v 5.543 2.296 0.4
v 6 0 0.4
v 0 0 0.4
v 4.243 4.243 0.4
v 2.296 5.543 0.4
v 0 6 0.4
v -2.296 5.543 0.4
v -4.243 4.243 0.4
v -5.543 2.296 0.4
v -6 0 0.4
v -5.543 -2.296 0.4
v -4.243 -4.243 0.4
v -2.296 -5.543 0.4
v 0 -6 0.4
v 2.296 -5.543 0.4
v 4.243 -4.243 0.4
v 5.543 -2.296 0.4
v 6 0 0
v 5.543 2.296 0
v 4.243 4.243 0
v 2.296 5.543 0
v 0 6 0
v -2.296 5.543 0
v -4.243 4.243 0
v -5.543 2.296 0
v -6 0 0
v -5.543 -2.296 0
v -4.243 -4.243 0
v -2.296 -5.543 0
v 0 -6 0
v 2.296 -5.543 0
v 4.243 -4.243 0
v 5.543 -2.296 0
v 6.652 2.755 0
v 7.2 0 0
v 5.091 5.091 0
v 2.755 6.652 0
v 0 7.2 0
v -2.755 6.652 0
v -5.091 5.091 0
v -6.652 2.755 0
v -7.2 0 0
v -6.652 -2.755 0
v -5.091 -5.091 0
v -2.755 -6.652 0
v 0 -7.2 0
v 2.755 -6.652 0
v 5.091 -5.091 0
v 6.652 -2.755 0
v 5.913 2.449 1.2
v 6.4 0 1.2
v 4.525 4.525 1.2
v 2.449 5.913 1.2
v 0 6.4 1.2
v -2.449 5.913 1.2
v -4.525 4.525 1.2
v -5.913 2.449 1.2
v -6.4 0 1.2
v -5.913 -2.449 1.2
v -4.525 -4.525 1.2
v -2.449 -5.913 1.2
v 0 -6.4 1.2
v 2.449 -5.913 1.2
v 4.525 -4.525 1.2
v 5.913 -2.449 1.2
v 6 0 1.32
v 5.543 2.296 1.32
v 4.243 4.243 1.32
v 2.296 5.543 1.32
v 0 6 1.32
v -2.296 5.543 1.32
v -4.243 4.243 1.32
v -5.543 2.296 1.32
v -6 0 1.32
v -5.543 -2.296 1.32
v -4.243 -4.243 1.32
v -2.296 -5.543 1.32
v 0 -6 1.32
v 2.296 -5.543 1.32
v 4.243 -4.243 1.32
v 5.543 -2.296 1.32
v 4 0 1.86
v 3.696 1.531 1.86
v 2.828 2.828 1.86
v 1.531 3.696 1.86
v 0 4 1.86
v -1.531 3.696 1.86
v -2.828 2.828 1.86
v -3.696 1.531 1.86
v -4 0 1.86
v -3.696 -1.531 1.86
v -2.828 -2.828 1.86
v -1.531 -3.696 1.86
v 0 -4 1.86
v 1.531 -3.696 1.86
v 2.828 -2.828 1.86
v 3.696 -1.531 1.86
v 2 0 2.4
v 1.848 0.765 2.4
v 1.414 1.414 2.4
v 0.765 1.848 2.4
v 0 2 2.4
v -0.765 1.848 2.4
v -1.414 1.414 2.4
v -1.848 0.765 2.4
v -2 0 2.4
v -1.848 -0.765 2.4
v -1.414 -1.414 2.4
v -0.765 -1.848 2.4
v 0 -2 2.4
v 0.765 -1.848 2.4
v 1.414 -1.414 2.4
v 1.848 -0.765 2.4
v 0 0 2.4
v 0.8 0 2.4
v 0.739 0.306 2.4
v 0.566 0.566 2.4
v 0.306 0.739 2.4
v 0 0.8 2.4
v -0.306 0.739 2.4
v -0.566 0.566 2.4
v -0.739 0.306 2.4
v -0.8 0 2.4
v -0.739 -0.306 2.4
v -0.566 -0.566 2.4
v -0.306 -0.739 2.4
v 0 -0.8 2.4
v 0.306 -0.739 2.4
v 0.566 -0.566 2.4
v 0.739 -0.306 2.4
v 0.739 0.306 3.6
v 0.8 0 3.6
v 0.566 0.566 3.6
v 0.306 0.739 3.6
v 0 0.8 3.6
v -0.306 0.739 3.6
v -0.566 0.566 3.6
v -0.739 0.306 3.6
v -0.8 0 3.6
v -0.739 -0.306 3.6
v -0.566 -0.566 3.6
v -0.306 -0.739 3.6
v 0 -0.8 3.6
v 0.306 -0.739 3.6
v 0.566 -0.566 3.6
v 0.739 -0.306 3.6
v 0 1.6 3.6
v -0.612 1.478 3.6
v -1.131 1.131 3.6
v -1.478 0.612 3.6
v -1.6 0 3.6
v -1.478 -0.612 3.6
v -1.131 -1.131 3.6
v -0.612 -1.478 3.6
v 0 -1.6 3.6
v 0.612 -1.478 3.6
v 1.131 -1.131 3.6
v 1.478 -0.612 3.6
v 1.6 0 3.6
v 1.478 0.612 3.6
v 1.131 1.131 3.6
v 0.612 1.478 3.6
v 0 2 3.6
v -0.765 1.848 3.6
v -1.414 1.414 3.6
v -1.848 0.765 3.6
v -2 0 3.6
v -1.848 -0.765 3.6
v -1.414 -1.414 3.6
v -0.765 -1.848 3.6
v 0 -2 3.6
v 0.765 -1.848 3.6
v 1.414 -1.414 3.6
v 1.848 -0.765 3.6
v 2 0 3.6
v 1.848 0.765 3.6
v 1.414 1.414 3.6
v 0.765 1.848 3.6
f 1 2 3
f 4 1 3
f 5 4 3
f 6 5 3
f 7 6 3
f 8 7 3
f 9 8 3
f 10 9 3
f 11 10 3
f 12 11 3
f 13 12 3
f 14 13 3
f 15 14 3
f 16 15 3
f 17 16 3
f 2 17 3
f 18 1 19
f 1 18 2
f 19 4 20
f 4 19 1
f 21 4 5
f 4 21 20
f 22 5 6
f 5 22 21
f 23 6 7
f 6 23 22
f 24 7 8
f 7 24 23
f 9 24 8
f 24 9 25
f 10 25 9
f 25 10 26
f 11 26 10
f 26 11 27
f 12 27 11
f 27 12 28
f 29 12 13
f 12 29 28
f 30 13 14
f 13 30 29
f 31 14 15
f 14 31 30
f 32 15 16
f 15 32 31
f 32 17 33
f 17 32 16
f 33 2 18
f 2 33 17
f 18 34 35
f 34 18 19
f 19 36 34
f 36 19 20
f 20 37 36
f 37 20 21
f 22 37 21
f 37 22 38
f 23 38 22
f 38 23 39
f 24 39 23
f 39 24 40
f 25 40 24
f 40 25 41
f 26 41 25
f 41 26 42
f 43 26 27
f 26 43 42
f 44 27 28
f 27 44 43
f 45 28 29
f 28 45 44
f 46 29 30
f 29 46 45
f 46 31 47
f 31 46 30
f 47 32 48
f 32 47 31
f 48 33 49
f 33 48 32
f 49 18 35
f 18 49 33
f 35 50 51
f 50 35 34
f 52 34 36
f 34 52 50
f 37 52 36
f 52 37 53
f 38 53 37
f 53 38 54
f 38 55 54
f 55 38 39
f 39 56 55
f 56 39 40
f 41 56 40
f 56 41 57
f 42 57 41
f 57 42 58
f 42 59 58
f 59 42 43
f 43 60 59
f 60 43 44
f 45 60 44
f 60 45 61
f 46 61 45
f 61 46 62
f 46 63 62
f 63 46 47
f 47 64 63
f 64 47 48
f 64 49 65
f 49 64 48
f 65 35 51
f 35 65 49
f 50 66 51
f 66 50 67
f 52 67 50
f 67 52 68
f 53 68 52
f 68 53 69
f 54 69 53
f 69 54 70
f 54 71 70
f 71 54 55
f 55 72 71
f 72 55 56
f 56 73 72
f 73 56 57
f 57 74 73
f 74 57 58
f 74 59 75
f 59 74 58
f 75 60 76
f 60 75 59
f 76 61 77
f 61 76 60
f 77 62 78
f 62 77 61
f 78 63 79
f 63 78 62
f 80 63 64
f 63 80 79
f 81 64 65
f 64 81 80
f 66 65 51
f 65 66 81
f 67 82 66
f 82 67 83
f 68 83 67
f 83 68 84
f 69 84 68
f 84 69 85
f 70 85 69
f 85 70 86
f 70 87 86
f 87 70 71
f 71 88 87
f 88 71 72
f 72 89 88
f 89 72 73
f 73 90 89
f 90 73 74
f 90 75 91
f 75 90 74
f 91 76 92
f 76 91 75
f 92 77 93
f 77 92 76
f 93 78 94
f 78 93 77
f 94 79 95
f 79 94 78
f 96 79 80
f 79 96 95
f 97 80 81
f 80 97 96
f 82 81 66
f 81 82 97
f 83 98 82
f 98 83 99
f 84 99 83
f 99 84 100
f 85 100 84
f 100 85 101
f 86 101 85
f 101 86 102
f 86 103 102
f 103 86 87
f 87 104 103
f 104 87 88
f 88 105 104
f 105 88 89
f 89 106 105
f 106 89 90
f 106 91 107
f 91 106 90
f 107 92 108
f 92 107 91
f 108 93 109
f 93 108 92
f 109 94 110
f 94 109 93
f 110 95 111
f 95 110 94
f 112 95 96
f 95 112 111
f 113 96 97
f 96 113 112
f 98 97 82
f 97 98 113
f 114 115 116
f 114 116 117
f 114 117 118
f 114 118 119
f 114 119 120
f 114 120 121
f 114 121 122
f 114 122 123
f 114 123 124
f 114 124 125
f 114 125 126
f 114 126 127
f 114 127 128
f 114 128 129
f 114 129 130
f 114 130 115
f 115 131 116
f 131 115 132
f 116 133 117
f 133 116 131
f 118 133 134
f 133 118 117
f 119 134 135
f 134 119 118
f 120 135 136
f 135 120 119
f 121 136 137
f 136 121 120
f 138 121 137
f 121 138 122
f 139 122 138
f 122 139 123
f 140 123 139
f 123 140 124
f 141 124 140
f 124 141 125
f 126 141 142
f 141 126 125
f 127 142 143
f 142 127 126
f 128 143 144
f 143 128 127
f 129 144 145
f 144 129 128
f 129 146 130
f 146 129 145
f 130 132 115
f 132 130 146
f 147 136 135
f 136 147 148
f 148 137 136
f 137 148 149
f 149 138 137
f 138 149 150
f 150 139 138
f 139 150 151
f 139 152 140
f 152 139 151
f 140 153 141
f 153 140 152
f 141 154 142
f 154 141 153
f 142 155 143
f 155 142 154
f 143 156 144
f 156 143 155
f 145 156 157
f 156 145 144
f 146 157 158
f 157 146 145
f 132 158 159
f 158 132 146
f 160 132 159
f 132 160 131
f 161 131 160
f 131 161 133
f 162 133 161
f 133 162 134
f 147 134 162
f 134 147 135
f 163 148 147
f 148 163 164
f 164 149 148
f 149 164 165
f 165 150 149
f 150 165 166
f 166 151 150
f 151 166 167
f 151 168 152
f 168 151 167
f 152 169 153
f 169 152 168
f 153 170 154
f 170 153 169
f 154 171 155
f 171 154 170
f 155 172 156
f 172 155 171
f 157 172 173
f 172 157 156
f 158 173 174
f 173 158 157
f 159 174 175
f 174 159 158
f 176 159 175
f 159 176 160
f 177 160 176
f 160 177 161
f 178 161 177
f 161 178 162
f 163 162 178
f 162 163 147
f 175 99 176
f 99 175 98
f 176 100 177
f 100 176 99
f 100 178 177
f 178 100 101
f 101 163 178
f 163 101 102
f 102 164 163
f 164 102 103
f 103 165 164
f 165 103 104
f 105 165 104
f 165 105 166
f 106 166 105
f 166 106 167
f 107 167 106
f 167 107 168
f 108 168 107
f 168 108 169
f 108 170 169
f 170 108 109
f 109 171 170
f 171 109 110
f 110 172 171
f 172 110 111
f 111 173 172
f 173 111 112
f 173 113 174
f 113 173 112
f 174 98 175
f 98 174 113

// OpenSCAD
use <../lib.scad>
use <../p/4-4con1.scad>
use <../p/4-4con15.scad>
use <../p/4-4con2.scad>
use <../p/4-4con8.scad>
use <../p/4-4cylc.scad>
use <../p/4-4cyli.scad>
use <../p/4-4edge.scad>
use <../p/4-4ring1.scad>
use <../p/4-4ring4.scad>
use <../p/4-4ring5.scad>
$fa=1; $fs=0.2;
function ldraw_lib__745(realsolid=false) = [
// 0 Roadsign Base Round Type 1
// 0 Name: 745.dat
// 0 Author: Tore Eriksson [Tore_Eriksson]
// 0 !LDRAW_ORG Part UPDATE 2010-02
// 0 !LICENSE Licensed under CC BY 2.0 and CC BY 4.0 : see CAreadme.txt
// 
// 0 BFC CERTIFY CCW
  [0,"BFC","CERTIFY"],
  [0,"BFC","CCW"],
// 
// 0 !CMDLINE -c8
// 
// 0 !HISTORY 2000-09-30 [PTadmin] Official Update 2000-02
// 0 !HISTORY 2007-07-22 [PTadmin] Header formatted for Contributor Agreement
// 0 !HISTORY 2008-07-01 [PTadmin] Official Update 2008-01
// 0 !HISTORY 2009-07-06 [tchang] Changed proportions, add BFC, primitives
// 0 !HISTORY 2010-07-05 [PTadmin] Official Update 2010-02
// 
// 
// 0 BFC INVERTNEXT
  [0,"BFC","INVERTNEXT"],
// 1 16 0 -1 0 15 0 0 0 1 0 0 0 15 4-4cylc.dat
  [1,16,0,-1,0,15,0,0,0,1,0,0,0,15, ldraw_lib__4_4cylc(realsolid)],
// 1 16 0 0 0 3 0 0 0 -1 0 0 0 3 4-4ring5.dat
  [1,16,0,0,0,3,0,0,0,-1,0,0,0,3, ldraw_lib__4_4ring5(realsolid)],
// 1 16 0 0 0 18 0 0 0 1 0 0 0 18 4-4edge.dat
  [1,16,0,0,0,18,0,0,0,1,0,0,0,18, ldraw_lib__4_4edge(realsolid)],
// 0 //
// 1 16 0 0 0 2 0 0 0 -3 0 0 0 2 4-4con8.dat
  [1,16,0,0,0,2,0,0,0,-3,0,0,0,2, ldraw_lib__4_4con8(realsolid)],
// 1 16 0 -3 0 16 0 0 0 1 0 0 0 16 4-4edge.dat
  [1,16,0,-3,0,16,0,0,0,1,0,0,0,16, ldraw_lib__4_4edge(realsolid)],
// 0 //
// 1 16 0 -3 0 1 0 0 0 -0.3 0 0 0 1 4-4con15.dat
  [1,16,0,-3,0,1,0,0,0,-0.3,0,0,0,1, ldraw_lib__4_4con15(realsolid)],
// 1 16 0 -3.3 0 5 0 0 0 -1.35 0 0 0 5 4-4con2.dat
  [1,16,0,-3.3,0,5,0,0,0,-1.35,0,0,0,5, ldraw_lib__4_4con2(realsolid)],
// 1 16 0 -4.65 0 5 0 0 0 -1.35 0 0 0 5 4-4con1.dat
  [1,16,0,-4.65,0,5,0,0,0,-1.35,0,0,0,5, ldraw_lib__4_4con1(realsolid)],
// 1 16 0 -6 0 5 0 0 0 1 0 0 0 5 4-4edge.dat
  [1,16,0,-6,0,5,0,0,0,1,0,0,0,5, ldraw_lib__4_4edge(realsolid)],
// 0 //
// 0 BFC INVERTNEXT
  [0,"BFC","INVERTNEXT"],
// 1 16 0 -6 0 2 0 0 0 -3 0 0 0 2 4-4cylc.dat
  [1,16,0,-6,0,2,0,0,0,-3,0,0,0,2, ldraw_lib__4_4cylc(realsolid)],
// 1 16 0 -9 0 2 0 0 0 1 0 0 0 2 4-4ring1.dat
  [1,16,0,-9,0,2,0,0,0,1,0,0,0,2, ldraw_lib__4_4ring1(realsolid)],
// 1 16 0 -9 0 1 0 0 0 1 0 0 0 1 4-4ring4.dat
  [1,16,0,-9,0,1,0,0,0,1,0,0,0,1, ldraw_lib__4_4ring4(realsolid)],
// 1 16 0 -9 0 5 0 0 0 1 0 0 0 5 4-4edge.dat
  [1,16,0,-9,0,5,0,0,0,1,0,0,0,5, ldraw_lib__4_4edge(realsolid)],
// 1 16 0 -9 0 5 0 0 0 3 0 0 0 5 4-4cyli.dat
  [1,16,0,-9,0,5,0,0,0,3,0,0,0,5, ldraw_lib__4_4cyli(realsolid)],
// 0 //
];
module ldraw_lib__745(step=0, col=false, unit=2/5, alt=false, line=0.2, solid=!$preview)
    makepoly(ldraw_lib__745(solid), step=step, col=col, unit=unit, alt=alt, line=line, solid=solid);
ldraw_lib__745(line=0.2);
